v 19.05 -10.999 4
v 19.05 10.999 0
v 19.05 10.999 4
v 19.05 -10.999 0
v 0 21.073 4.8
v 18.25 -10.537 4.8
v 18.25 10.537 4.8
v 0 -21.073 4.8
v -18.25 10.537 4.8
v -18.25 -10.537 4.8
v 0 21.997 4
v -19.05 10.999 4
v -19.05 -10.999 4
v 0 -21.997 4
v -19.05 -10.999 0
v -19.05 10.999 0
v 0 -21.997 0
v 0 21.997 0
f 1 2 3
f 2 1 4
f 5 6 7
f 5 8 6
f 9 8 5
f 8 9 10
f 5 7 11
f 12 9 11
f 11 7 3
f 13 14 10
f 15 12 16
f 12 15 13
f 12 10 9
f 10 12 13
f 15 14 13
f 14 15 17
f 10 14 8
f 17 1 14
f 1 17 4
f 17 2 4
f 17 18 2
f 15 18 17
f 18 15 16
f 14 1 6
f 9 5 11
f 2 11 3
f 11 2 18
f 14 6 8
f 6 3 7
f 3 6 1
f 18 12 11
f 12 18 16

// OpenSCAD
// ========================================================================
// Parametric Dual-Color Hexagonal "Hive" 3D Printable Tile
// OpenSCAD Customizer Compatible
// ========================================================================

/* [Tile Dimensions] */
// Flat-to-flat diameter in mm (38.1 mm = 1.5 inches)
tile_flat_to_flat = 38.1; // [20.0:0.1:100.0]

// Total tile height/thickness in mm
tile_height = 4.8; // [2.0:0.1:15.0]

// 45-degree top perimeter chamfer size in mm
chamfer = 0.8; // [0.0:0.1:3.0]

// Recessed inlay depth for the insect glyph in mm
inlay_depth = 0.8; // [0.2:0.1:3.0]

// Additional raised emboss height above tile surface (0 for flush)
emboss_height = 0.0; // [0.0:0.1:3.0]

/* [Insect Selection] */
// Choose the insect piece to render
insect_type = "queen_bee"; // [queen_bee:Queen Bee, spider:Spider, beetle:Beetle, grasshopper:Grasshopper, ant:Soldier Ant, mosquito:Mosquito, ladybug:Ladybug, pillbug:Pillbug]

/* [Rendering & Multi-Material Mode] */
// Select which parts to render
render_mode = "both"; // [both:Dual Color Assembly, base_only:Base Tile Only, insect_only:Insect Inlay Only]

// Preview color for base tile (Ivory or Carbon Black)
color_base = "Ivory";

// Preview color for insect inlay (e.g. Gold, Red, Green, Blue, Black)
color_insect = "#E65100";

/* [Hidden] */
$fn = 6; // Regular hexagon

// Calculate Hexagon radii
r_flat = tile_flat_to_flat / 2.0;
r_vertex = r_flat / cos(30);

r_top_flat = (tile_flat_to_flat - 2 * chamfer) / 2.0;
r_top_vertex = r_top_flat / cos(30);

// --- 2D Hexagon Profile ---
module hex_profile(radius) {
    rotate([0, 0, 30])
    circle(r = radius, $fn = 6);
}

// --- Solid Chamfered Base Hexagon ---
module solid_hex_base() {
    hull() {
        linear_extrude(height = max(0.01, tile_height - chamfer))
            hex_profile(r_vertex);
            
        translate([0, 0, tile_height - 0.01])
            linear_extrude(height = 0.01)
                hex_profile(r_top_vertex);
    }
}

// --- 2D Insect Outlines ---
module insect_queen_bee_2d() {
    // Head & Crown
    translate([0, 4.8, 0]) circle(r = 1.8, $fn=32);
    polygon([[-2.0, 5.2], [-2.0, 8.0], [-1.0, 6.6], [0, 8.6], [1.0, 6.6], [2.0, 8.0], [2.0, 5.2]]);
    // Thorax
    translate([0, 1.8, 0]) scale([2.5/2, 2.0/2, 1]) circle(r=2, $fn=32);
    // Abdomen with stripes
    difference() {
        offset(r = 0.8) polygon([[0, -7.5], [-3.0, -1.0], [3.0, -1.0]]);
        translate([-4, -2.4, 0]) square([8, 0.7]);
        translate([-3.5, -4.3, 0]) square([7, 0.7]);
        translate([-2.5, -6.0, 0]) square([5, 0.6]);
    }
    // Wings
    translate([-5.8, 3.0, 0]) rotate([0, 0, -35]) scale([5.0/2, 1.8/2, 1]) circle(r=2, $fn=32);
    translate([5.8, 3.0, 0]) rotate([0, 0, 35]) scale([5.0/2, 1.8/2, 1]) circle(r=2, $fn=32);
    translate([-5.0, 1.0, 0]) rotate([0, 0, -55]) scale([3.8/2, 1.4/2, 1]) circle(r=2, $fn=32);
    translate([5.0, 1.0, 0]) rotate([0, 0, 55]) scale([3.8/2, 1.4/2, 1]) circle(r=2, $fn=32);
}

module insect_spider_2d() {
    translate([0, 3.0, 0]) circle(r = 1.7, $fn=32);
    translate([0, -2.5, 0]) scale([3.2/2, 4.2/2, 1]) circle(r=2, $fn=32);
    // 8 Legs
    for (s = [-1, 1]) {
        scale([s, 1, 1]) {
            hull() { translate([1.0, 2.8, 0]) circle(r=0.45, $fn=16); translate([4.5, 6.2, 0]) circle(r=0.45, $fn=16); }
            hull() { translate([4.5, 6.2, 0]) circle(r=0.45, $fn=16); translate([7.5, 8.8, 0]) circle(r=0.45, $fn=16); }
            hull() { translate([1.2, 1.8, 0]) circle(r=0.45, $fn=16); translate([6.5, 3.8, 0]) circle(r=0.45, $fn=16); }
            hull() { translate([6.5, 3.8, 0]) circle(r=0.45, $fn=16); translate([9.5, 4.2, 0]) circle(r=0.45, $fn=16); }
            hull() { translate([1.2, 0.5, 0]) circle(r=0.45, $fn=16); translate([6.8, -1.0, 0]) circle(r=0.45, $fn=16); }
            hull() { translate([6.8, -1.0, 0]) circle(r=0.45, $fn=16); translate([9.0, -3.5, 0]) circle(r=0.45, $fn=16); }
            hull() { translate([1.0, -1.0, 0]) circle(r=0.45, $fn=16); translate([5.5, -4.5, 0]) circle(r=0.45, $fn=16); }
            hull() { translate([5.5, -4.5, 0]) circle(r=0.45, $fn=16); translate([7.0, -8.5, 0]) circle(r=0.45, $fn=16); }
        }
    }
}

module insect_2d() {
    if (insect_type == "queen_bee") insect_queen_bee_2d();
    else if (insect_type == "spider") insect_spider_2d();
    else insect_queen_bee_2d(); // fallback
}

// --- 3D Modules ---
module insect_inlay_3d() {
    z_start = tile_height - inlay_depth;
    total_h = inlay_depth + emboss_height;
    
    translate([0, 0, z_start])
    linear_extrude(height = total_h, convexity = 10)
        insect_2d();
}

module base_tile_3d() {
    difference() {
        solid_hex_base();
        
        translate([0, 0, tile_height - inlay_depth - 0.01])
        linear_extrude(height = inlay_depth + 1.0, convexity = 10)
            insect_2d();
    }
}

// --- Render Pipeline ---
if (render_mode == "both") {
    color(color_base) base_tile_3d();
    color(color_insect) insect_inlay_3d();
}
else if (render_mode == "base_only") {
    base_tile_3d();
}
else if (render_mode == "insect_only") {
    insect_inlay_3d();
}
